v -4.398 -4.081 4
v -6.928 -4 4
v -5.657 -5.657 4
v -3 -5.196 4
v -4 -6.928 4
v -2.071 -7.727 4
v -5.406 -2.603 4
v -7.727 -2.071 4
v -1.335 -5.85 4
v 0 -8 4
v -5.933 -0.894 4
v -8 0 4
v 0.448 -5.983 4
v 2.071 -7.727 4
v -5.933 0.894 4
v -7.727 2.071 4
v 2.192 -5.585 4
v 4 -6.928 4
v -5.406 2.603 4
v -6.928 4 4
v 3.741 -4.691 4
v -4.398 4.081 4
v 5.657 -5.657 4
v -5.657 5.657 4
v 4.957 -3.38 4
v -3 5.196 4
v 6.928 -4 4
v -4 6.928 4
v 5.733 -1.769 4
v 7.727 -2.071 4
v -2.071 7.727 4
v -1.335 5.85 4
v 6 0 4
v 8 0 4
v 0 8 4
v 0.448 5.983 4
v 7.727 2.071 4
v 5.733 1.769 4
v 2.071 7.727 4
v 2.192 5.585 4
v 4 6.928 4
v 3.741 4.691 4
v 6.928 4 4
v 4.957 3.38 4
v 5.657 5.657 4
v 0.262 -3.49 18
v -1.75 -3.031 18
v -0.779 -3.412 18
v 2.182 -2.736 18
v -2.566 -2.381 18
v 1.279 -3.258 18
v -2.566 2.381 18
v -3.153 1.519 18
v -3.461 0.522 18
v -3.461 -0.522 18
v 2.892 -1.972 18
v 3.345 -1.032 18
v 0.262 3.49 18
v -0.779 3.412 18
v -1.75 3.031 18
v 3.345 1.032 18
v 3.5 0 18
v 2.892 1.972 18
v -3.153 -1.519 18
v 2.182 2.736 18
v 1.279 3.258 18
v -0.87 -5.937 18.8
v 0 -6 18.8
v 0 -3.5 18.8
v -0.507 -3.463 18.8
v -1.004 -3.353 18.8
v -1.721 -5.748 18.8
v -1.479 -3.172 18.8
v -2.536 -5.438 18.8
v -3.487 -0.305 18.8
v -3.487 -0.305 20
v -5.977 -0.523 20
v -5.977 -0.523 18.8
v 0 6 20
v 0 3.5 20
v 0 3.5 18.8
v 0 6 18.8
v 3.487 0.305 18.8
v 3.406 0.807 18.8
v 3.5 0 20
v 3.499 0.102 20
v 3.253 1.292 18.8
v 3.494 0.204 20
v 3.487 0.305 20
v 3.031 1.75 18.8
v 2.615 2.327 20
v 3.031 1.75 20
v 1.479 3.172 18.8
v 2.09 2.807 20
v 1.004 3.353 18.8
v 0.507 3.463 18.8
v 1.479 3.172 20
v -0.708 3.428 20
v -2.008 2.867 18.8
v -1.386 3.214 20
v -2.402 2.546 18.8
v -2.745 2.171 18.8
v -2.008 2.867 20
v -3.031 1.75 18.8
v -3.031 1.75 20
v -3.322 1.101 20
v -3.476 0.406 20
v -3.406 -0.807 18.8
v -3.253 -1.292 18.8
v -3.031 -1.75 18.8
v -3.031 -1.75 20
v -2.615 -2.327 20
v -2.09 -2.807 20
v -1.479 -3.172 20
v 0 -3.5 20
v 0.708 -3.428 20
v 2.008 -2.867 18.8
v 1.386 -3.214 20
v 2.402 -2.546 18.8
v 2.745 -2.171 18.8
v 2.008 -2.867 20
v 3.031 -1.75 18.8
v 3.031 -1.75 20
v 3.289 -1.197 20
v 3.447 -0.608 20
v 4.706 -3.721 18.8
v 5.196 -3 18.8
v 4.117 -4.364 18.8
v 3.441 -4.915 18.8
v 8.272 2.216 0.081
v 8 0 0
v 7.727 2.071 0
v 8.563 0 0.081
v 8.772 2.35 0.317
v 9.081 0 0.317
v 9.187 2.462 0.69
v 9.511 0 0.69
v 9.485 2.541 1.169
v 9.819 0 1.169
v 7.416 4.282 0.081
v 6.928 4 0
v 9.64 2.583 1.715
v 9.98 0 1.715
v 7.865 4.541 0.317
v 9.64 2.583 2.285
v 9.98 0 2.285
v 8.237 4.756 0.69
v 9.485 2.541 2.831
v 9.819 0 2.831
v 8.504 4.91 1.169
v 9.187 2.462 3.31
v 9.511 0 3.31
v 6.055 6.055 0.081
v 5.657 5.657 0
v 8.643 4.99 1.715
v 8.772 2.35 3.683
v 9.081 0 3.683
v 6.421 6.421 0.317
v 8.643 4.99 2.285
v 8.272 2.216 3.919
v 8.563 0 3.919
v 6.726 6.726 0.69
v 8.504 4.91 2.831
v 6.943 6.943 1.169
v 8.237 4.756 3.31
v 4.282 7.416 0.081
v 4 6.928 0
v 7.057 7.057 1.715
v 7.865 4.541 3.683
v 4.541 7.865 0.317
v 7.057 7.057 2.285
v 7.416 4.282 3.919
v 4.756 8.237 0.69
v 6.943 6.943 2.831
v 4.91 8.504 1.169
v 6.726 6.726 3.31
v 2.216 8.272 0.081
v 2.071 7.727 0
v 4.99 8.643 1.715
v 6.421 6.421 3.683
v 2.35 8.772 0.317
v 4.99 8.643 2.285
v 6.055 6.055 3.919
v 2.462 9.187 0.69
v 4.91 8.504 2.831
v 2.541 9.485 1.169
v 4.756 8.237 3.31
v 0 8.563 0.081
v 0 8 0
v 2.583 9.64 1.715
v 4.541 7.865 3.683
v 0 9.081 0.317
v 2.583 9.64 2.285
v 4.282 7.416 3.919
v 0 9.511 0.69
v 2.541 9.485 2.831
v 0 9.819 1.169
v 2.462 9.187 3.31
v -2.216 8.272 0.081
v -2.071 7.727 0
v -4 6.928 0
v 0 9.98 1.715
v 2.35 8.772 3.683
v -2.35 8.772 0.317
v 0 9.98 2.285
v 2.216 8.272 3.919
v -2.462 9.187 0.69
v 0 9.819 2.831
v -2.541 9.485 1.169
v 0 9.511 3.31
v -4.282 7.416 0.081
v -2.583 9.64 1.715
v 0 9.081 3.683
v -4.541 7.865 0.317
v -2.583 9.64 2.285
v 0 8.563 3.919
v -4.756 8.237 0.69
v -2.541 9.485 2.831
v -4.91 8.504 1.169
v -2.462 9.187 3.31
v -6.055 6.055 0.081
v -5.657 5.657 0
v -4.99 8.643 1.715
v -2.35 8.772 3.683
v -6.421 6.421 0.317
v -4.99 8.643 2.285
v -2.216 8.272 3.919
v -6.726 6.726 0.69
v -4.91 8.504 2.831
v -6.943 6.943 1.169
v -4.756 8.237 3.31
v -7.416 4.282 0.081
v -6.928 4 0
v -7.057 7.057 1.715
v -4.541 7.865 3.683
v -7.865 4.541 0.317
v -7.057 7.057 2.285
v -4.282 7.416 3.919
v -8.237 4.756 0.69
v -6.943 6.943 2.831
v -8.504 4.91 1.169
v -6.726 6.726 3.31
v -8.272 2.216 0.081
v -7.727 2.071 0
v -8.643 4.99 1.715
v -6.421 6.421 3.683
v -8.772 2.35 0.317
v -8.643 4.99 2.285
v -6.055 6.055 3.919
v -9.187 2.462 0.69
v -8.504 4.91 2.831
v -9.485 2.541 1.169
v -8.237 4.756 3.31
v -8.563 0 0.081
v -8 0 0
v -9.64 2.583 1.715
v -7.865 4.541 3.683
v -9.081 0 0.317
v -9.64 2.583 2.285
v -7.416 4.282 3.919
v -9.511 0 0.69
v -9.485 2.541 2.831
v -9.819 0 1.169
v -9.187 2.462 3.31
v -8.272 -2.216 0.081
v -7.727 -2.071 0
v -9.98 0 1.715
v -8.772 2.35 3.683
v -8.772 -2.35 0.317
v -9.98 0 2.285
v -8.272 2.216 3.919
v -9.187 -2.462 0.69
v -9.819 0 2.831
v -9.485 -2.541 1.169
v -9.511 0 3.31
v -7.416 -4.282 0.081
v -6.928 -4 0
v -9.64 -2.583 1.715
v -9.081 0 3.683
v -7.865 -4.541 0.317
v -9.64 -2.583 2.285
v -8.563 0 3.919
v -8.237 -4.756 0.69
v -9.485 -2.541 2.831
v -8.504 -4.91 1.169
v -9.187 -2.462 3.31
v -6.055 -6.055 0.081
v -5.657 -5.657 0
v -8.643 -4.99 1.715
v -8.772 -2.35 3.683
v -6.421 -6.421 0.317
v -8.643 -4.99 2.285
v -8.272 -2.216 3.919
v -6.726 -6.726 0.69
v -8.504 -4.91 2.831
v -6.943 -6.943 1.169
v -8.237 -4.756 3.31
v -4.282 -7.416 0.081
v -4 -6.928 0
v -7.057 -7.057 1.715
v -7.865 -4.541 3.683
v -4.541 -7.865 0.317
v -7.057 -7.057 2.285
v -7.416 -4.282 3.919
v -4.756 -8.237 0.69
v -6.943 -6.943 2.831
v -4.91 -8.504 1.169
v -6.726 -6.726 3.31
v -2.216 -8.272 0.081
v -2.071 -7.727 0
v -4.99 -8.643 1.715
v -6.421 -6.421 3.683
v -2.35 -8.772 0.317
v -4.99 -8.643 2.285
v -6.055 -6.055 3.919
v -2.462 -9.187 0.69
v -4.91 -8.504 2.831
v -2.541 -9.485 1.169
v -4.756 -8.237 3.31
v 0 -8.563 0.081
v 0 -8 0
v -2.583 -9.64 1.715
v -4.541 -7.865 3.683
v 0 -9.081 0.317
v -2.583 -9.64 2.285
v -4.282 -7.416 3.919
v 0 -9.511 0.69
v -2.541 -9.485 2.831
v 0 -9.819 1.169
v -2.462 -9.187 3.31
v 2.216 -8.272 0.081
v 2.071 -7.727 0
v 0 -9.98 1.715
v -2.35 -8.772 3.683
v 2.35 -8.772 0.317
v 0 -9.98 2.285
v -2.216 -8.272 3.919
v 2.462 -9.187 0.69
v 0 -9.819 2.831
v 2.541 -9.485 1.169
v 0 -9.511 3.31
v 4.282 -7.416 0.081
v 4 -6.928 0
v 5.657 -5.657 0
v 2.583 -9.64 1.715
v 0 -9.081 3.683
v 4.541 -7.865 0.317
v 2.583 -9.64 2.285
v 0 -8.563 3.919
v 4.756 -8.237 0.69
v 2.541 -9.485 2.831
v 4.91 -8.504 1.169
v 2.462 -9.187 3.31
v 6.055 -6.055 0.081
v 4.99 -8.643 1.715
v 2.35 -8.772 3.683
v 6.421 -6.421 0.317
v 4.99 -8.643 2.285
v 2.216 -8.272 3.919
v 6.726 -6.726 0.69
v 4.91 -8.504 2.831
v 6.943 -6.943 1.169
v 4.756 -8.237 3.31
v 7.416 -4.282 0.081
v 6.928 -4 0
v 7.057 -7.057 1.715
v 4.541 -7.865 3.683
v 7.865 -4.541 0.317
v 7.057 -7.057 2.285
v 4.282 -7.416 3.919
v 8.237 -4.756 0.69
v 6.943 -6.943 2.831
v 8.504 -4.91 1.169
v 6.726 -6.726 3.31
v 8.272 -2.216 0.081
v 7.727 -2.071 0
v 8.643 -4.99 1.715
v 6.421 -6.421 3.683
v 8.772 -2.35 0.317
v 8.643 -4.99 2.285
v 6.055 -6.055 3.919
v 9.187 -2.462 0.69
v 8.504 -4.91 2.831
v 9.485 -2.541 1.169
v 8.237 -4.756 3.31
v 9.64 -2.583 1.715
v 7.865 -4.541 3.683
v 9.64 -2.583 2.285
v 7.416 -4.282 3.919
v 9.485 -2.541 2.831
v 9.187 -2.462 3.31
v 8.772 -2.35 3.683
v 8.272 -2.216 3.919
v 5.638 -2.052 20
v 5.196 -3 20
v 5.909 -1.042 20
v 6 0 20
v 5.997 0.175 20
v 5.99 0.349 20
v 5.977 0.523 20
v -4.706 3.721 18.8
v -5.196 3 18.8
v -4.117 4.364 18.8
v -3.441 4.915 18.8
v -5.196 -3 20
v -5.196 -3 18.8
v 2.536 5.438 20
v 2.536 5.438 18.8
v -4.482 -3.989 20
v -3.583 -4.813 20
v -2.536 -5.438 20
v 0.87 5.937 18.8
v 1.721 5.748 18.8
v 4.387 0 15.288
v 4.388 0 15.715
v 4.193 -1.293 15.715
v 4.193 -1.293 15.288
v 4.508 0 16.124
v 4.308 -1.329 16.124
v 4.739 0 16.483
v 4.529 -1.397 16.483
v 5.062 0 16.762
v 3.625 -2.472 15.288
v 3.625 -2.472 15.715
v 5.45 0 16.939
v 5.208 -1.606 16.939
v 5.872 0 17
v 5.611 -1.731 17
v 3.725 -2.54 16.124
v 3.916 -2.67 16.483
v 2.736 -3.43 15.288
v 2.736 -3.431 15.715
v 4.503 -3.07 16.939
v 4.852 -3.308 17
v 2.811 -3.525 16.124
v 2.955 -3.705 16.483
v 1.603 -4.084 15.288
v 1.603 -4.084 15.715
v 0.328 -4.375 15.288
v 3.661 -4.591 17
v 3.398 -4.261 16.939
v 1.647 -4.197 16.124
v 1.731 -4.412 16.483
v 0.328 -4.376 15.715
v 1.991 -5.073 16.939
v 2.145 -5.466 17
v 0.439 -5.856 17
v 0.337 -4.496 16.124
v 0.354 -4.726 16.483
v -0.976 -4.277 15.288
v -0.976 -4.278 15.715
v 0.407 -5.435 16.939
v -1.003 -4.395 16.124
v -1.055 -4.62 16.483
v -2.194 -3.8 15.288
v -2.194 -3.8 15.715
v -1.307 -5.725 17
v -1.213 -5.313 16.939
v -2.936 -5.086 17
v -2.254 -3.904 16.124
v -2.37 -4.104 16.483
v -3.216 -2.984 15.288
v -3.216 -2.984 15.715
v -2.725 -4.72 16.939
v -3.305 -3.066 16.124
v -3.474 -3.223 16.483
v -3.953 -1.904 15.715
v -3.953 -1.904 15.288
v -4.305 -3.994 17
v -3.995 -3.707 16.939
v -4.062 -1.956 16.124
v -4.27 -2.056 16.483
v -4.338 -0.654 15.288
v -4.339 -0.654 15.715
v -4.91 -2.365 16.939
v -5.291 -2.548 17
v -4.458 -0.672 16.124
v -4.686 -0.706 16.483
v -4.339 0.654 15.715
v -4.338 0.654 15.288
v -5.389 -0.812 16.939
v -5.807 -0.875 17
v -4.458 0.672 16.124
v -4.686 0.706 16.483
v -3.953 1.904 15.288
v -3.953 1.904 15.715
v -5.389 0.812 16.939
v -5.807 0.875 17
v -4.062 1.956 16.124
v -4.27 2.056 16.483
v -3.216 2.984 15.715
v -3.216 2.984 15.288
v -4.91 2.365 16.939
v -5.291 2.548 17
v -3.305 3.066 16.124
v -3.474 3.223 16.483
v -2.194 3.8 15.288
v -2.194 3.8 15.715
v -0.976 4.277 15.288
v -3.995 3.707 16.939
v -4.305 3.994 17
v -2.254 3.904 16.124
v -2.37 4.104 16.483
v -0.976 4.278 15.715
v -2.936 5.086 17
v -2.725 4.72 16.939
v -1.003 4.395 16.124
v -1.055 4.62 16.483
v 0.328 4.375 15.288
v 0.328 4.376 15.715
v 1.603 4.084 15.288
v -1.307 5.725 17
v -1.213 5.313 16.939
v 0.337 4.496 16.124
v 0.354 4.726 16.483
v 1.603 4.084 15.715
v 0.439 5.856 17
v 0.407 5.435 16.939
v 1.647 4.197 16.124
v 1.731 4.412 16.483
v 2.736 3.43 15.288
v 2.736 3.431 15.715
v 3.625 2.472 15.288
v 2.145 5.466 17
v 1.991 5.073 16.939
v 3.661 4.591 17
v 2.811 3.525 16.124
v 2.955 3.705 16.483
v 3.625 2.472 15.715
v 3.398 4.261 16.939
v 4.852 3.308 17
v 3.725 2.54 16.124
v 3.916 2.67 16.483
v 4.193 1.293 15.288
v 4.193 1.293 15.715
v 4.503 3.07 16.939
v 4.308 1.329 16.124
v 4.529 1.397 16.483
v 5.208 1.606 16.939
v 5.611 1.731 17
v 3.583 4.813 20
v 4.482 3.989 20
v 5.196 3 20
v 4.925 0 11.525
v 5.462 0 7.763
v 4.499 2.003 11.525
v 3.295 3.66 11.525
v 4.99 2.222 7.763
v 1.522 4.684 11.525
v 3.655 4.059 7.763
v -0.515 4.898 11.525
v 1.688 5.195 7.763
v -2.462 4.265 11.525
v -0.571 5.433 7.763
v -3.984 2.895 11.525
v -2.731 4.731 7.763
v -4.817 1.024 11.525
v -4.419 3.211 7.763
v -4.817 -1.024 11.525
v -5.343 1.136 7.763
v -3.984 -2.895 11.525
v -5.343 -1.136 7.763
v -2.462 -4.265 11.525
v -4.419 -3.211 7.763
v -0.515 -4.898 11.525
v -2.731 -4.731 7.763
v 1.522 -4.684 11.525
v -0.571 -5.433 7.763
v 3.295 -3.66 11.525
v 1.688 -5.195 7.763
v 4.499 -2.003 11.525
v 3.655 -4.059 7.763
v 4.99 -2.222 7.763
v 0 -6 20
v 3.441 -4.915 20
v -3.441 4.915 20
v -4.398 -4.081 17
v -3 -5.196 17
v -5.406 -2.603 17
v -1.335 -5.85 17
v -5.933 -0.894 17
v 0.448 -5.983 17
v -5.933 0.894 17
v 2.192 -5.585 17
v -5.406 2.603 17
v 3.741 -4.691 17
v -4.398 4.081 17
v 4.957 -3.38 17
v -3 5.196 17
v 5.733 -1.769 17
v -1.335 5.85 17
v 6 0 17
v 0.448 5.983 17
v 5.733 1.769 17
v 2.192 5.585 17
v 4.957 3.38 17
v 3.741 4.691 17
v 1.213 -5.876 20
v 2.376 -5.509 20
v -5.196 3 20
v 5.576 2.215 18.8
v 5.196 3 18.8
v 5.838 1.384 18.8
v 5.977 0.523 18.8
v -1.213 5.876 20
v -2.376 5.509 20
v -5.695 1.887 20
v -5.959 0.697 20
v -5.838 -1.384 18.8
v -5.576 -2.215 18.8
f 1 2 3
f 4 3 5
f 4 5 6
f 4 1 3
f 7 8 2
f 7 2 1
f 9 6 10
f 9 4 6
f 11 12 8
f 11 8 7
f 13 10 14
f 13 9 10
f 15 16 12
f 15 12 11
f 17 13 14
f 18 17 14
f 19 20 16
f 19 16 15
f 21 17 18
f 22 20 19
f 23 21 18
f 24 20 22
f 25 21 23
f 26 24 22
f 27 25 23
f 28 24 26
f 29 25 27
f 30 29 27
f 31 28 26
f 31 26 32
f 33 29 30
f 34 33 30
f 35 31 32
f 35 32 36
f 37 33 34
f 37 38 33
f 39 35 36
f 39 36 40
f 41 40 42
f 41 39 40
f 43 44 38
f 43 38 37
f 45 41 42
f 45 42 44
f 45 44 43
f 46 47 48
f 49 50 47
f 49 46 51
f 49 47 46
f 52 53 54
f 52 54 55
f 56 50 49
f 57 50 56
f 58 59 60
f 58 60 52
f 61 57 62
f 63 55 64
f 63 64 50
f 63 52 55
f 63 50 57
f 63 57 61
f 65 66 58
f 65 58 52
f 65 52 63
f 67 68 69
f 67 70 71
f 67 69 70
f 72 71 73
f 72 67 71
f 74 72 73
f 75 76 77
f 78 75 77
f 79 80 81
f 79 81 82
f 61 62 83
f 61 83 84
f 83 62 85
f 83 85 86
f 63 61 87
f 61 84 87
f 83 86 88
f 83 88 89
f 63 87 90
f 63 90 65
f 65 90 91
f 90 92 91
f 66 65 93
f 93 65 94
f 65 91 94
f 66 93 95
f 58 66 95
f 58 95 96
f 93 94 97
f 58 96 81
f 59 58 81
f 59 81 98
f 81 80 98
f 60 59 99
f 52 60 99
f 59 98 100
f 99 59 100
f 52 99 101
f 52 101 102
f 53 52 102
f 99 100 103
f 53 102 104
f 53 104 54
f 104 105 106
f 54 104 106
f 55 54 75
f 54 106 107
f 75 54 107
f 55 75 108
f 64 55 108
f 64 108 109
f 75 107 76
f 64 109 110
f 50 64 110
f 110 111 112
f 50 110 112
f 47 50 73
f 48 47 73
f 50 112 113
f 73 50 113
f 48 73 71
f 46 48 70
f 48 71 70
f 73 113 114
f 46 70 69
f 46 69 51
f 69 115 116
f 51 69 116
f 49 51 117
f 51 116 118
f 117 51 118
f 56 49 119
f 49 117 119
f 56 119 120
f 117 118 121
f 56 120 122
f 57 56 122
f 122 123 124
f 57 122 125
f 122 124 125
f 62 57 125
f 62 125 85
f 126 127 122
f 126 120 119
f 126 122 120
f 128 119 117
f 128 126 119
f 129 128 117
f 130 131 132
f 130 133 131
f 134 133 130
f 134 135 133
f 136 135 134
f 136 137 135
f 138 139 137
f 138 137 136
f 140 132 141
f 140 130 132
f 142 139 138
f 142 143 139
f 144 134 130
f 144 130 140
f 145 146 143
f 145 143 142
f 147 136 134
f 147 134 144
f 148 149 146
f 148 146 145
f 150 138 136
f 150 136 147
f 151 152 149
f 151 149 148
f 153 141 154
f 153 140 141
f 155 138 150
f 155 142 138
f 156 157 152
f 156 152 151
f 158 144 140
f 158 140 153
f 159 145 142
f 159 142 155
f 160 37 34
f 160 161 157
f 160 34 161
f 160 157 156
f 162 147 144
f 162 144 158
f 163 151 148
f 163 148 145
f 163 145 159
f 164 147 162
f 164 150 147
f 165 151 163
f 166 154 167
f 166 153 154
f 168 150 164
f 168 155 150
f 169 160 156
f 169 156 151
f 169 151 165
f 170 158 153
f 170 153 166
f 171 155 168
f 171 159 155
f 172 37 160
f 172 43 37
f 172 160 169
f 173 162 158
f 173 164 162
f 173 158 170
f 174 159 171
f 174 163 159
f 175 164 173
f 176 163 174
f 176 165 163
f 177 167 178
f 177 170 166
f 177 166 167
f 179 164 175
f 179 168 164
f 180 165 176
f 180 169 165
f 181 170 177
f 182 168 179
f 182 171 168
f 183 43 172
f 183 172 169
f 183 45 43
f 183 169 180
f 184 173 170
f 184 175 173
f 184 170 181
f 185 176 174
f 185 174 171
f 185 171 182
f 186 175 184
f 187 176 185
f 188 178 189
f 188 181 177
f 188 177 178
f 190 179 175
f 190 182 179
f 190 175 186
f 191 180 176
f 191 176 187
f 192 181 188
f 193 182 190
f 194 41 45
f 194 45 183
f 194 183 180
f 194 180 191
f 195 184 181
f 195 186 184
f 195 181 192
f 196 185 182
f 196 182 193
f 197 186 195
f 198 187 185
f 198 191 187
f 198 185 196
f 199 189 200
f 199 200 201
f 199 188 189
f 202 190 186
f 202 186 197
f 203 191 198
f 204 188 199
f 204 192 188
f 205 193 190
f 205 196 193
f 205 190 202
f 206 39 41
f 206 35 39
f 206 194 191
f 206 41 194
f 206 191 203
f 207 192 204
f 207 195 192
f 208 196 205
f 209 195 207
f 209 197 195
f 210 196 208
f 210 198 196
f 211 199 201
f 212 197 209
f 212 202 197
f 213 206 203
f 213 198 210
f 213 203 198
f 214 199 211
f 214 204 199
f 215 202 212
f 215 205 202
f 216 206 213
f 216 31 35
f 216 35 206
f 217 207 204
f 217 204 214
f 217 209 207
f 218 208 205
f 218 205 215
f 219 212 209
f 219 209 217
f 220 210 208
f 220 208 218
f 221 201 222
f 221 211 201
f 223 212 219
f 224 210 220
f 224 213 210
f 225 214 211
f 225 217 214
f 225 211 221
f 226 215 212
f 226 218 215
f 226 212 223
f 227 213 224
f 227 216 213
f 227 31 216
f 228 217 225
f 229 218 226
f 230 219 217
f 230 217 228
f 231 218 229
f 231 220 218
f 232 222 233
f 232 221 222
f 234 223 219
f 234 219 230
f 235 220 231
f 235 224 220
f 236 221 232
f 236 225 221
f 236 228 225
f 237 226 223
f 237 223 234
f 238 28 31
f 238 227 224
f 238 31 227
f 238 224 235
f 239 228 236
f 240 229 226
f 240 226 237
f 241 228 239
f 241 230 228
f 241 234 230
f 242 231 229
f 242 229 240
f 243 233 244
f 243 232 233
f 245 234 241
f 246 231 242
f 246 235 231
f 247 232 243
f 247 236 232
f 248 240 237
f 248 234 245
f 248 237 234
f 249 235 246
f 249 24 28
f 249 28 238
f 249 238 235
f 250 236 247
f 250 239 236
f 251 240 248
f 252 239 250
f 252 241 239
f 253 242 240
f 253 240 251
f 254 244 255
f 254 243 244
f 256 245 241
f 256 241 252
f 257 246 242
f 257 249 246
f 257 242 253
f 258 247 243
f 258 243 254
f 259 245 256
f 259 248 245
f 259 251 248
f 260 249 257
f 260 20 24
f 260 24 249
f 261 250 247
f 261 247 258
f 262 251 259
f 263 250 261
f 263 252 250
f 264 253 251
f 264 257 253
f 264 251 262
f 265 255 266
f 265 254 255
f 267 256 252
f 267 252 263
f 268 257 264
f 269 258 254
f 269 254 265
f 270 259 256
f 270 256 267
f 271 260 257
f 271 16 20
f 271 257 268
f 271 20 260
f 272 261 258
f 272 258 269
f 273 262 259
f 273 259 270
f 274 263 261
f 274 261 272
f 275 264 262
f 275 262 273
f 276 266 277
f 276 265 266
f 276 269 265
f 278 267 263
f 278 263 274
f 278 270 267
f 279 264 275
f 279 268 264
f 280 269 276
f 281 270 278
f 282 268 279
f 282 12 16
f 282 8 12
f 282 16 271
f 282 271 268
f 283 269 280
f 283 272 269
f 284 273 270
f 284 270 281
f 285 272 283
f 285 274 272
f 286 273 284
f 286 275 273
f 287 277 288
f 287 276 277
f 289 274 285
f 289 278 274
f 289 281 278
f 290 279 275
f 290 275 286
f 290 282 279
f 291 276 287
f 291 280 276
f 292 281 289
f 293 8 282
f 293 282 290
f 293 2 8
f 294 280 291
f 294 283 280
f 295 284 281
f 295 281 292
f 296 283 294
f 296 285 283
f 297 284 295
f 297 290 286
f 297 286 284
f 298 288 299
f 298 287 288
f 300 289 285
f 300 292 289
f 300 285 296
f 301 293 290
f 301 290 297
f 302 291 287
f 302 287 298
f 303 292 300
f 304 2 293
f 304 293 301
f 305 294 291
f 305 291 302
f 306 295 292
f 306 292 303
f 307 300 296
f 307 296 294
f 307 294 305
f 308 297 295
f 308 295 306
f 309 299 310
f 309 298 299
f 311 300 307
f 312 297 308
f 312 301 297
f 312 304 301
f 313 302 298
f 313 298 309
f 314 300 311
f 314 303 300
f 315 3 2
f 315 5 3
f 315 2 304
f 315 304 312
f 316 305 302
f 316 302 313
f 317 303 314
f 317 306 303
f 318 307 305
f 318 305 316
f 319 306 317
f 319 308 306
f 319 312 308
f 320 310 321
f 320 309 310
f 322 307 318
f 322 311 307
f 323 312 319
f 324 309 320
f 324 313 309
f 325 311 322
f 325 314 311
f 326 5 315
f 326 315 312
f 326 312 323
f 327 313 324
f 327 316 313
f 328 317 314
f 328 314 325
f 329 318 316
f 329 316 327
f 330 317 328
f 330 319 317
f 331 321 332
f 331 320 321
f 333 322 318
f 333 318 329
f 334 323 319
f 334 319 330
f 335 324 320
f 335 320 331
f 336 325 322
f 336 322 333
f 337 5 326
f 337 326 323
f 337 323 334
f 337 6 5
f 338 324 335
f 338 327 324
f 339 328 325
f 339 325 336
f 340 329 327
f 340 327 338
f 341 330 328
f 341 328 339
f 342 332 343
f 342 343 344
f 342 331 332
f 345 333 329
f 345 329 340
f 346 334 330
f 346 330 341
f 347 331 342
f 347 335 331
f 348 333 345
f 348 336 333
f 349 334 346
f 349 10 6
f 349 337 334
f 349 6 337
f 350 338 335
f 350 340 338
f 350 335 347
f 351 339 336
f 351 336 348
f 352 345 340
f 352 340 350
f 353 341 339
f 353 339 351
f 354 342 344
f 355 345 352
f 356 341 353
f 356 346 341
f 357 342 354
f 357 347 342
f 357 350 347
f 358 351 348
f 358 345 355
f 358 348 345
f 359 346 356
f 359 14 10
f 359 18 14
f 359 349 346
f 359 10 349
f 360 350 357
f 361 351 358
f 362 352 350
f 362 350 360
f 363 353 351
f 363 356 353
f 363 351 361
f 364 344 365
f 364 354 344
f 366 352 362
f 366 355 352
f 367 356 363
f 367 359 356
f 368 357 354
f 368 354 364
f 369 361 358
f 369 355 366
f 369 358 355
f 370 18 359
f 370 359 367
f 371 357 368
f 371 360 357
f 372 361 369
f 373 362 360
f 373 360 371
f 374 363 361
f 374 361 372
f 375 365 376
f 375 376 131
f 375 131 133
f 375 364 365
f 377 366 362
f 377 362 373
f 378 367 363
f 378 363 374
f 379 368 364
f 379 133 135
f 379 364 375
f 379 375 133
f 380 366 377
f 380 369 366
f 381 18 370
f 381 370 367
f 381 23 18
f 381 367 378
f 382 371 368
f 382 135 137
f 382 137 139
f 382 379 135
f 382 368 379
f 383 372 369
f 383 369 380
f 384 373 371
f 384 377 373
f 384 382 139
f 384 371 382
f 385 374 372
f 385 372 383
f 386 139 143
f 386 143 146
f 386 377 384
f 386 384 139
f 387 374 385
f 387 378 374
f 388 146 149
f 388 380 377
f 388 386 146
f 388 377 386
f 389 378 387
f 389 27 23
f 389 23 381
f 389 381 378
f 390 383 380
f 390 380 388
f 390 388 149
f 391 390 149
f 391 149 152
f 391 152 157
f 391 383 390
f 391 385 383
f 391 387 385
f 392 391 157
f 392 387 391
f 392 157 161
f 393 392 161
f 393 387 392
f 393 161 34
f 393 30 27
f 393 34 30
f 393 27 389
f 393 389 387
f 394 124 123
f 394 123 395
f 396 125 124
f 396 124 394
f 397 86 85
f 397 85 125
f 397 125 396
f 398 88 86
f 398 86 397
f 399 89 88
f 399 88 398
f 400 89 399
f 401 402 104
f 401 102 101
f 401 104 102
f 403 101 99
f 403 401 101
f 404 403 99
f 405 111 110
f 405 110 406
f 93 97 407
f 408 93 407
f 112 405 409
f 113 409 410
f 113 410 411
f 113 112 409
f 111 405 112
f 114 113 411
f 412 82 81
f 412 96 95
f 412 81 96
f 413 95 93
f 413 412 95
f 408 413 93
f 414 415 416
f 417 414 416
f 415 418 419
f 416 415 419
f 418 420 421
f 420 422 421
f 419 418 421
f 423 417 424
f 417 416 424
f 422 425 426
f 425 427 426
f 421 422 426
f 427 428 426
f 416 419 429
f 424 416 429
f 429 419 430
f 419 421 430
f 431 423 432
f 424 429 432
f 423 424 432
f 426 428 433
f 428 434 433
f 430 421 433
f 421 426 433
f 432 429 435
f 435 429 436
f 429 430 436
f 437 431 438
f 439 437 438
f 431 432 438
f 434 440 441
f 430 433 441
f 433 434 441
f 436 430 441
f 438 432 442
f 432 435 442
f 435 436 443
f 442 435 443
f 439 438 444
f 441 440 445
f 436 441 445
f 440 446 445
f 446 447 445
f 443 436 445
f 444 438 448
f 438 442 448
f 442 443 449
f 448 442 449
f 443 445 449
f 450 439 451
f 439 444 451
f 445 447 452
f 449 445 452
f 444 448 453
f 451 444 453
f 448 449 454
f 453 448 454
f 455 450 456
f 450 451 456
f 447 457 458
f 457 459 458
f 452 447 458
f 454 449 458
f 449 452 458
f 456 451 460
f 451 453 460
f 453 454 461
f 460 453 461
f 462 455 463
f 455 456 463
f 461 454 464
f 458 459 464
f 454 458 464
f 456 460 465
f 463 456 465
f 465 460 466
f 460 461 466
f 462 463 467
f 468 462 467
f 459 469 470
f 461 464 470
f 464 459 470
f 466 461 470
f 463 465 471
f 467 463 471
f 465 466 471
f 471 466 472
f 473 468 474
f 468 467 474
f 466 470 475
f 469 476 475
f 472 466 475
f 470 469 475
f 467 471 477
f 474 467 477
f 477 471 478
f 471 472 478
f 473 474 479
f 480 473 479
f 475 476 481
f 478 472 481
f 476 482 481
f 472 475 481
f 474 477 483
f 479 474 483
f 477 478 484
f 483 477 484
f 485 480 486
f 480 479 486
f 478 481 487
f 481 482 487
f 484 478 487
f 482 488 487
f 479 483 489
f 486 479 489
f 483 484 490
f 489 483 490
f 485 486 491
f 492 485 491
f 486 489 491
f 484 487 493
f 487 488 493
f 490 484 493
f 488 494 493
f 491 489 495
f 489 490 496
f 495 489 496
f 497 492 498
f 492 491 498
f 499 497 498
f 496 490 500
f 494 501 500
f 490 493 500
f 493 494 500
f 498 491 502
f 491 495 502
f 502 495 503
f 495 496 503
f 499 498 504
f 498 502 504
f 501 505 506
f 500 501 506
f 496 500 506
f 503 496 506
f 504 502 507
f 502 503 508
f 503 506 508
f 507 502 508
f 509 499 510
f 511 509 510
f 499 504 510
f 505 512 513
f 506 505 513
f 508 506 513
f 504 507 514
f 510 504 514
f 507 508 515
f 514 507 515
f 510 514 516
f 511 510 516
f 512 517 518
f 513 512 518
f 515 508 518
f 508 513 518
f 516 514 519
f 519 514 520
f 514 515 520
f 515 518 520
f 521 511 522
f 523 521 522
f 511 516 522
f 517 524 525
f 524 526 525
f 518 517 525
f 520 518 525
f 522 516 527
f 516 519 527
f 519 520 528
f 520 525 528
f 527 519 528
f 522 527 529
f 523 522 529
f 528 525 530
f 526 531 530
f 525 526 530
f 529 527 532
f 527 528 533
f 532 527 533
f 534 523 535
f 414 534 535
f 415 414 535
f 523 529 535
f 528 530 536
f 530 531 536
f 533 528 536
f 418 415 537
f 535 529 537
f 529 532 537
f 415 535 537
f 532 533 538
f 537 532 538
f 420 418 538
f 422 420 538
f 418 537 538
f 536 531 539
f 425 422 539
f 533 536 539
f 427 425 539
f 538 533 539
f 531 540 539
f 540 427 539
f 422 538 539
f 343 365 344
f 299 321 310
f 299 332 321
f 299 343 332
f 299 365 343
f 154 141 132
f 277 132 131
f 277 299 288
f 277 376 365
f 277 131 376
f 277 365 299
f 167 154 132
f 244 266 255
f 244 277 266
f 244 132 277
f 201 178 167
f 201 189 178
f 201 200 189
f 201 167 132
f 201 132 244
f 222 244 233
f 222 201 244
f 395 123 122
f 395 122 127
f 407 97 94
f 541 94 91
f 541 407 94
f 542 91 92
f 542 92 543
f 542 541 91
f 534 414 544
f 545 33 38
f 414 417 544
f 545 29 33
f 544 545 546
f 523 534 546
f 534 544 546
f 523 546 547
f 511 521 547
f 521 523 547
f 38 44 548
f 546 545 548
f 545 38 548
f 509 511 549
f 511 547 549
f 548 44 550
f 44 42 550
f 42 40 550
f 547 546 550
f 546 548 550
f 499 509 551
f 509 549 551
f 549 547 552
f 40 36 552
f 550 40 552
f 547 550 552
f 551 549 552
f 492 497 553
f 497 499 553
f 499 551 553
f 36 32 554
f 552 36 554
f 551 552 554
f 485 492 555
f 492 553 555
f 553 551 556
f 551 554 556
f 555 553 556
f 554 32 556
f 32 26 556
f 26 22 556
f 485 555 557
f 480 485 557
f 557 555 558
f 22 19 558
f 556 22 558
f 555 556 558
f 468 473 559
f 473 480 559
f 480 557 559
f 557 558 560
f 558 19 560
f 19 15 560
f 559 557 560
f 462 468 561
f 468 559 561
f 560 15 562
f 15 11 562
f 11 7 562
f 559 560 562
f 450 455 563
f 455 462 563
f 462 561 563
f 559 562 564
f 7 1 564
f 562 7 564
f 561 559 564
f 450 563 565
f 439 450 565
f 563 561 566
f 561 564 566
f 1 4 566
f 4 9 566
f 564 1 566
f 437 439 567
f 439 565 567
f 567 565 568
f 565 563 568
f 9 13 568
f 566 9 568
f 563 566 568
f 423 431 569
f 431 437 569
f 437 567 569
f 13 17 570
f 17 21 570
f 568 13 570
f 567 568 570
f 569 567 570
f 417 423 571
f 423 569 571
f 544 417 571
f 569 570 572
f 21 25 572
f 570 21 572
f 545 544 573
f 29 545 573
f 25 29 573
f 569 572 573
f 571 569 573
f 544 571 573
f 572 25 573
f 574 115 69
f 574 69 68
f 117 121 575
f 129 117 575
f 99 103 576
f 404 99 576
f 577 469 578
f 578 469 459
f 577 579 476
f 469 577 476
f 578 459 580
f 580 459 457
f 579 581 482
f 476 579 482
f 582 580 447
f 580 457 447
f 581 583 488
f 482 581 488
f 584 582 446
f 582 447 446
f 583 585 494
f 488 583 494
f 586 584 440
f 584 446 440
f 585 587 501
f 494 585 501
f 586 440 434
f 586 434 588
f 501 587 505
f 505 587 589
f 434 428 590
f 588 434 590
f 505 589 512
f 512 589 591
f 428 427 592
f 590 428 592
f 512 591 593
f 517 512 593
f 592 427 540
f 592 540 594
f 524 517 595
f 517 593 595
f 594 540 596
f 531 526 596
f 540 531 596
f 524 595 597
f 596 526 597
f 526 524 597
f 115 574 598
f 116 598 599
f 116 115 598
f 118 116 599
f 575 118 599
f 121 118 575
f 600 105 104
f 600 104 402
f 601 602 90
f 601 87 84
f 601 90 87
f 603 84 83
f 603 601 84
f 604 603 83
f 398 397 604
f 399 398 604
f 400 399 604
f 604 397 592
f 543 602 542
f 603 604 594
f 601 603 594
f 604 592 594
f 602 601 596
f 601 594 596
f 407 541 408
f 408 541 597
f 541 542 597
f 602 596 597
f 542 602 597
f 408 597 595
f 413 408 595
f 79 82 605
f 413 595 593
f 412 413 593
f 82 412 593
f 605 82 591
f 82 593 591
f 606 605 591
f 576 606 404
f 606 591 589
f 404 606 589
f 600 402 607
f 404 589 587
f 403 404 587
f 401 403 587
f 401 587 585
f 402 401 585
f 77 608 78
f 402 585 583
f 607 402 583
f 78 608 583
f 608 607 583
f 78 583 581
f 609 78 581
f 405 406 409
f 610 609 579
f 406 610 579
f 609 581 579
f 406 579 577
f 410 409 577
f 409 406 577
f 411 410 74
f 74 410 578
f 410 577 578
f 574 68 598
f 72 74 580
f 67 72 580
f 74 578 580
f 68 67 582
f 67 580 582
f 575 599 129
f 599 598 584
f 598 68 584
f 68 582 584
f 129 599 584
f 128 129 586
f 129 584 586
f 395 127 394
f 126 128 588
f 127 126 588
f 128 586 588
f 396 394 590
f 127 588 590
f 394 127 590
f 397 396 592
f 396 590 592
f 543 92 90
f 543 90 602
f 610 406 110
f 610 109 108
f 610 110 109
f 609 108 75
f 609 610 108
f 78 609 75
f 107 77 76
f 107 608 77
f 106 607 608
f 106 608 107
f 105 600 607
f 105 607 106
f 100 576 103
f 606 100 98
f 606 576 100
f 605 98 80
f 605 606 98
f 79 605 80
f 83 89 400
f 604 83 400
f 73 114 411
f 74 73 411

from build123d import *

# Parameters (mm, degrees)
SKETCH004_R        = 4
SKETCH001_R        = 6
SKETCH002_R        = 6
EXTRUDE002_DEPTH   = 3
SKETCH005_R        = 3.5
POCKET_DEPTH       = 5
POCKET001_DEPTH    = 1.2
POLARPATTERN_COUNT = 6
FILLET_R           = 1.5


with BuildPart() as revolution:
    # Sketch006 → Revolution (revolve)
    with BuildSketch(Plane.XZ):
        with BuildLine():
            Line((0, 0), (8, 0))
            ThreePointArc((8, 0), (10, 2), (8, 4))
            Line((8, 4), (0, 4))
            Line((0, 4), (0, 0))
        make_face()
    revolve(axis=Axis((0, 0, 0), (0, 0, 1)))


with BuildPart() as loft_body:
    # Sketch004 → Loft section 0
    with BuildSketch(Plane.XY.offset(18)):
        Circle(SKETCH004_R)
    # Sketch001 → Loft section 1
    with BuildSketch(Plane.XY.offset(4)):
        Circle(SKETCH001_R)
    loft()


with BuildPart() as fillet_body:
    # Sketch002 → Extrude002 (new body)
    with BuildSketch(Plane.XY.offset(17)):
        Circle(SKETCH002_R)
    extrude(amount=EXTRUDE002_DEPTH)

    # Sketch005 → Pocket (cut)
    with BuildSketch(Plane.XY.offset(20)):
        Circle(SKETCH005_R)
    extrude(amount=-POCKET_DEPTH, mode=Mode.SUBTRACT)

    # Sketch → Pocket001 (cut)
    with BuildSketch(Plane.XY.offset(20)):
        with BuildLine():
            ThreePointArc((2.53571, 5.437847), (1.298638, 5.857776), (0, 6))
            Line((0, 0), (0, 6))
            Line((0, 0), (2.53571, 5.437847))
        make_face()
    pocket001 = extrude(amount=-POCKET001_DEPTH, mode=Mode.SUBTRACT)

    # PolarPattern: Pocket001 ×6 about axis
    polarpattern_axis = Axis((0, 0, 20), (0, 0, 1))
    for i in range(1, POLARPATTERN_COUNT):
        add(pocket001.rotate(polarpattern_axis, i * 360 / POLARPATTERN_COUNT), mode=Mode.SUBTRACT)

    # Fusion: union Revolution, Loft body
    add(revolution.part)
    add(loft_body.part)

    # Fillet
    fillet_edges = [fillet_body.edges().sort_by_distance(p)[0] for p in [
        (-4.142857, 0, 17),
    ]]
    fillet(fillet_edges, radius=FILLET_R)


solid = fillet_body.part
